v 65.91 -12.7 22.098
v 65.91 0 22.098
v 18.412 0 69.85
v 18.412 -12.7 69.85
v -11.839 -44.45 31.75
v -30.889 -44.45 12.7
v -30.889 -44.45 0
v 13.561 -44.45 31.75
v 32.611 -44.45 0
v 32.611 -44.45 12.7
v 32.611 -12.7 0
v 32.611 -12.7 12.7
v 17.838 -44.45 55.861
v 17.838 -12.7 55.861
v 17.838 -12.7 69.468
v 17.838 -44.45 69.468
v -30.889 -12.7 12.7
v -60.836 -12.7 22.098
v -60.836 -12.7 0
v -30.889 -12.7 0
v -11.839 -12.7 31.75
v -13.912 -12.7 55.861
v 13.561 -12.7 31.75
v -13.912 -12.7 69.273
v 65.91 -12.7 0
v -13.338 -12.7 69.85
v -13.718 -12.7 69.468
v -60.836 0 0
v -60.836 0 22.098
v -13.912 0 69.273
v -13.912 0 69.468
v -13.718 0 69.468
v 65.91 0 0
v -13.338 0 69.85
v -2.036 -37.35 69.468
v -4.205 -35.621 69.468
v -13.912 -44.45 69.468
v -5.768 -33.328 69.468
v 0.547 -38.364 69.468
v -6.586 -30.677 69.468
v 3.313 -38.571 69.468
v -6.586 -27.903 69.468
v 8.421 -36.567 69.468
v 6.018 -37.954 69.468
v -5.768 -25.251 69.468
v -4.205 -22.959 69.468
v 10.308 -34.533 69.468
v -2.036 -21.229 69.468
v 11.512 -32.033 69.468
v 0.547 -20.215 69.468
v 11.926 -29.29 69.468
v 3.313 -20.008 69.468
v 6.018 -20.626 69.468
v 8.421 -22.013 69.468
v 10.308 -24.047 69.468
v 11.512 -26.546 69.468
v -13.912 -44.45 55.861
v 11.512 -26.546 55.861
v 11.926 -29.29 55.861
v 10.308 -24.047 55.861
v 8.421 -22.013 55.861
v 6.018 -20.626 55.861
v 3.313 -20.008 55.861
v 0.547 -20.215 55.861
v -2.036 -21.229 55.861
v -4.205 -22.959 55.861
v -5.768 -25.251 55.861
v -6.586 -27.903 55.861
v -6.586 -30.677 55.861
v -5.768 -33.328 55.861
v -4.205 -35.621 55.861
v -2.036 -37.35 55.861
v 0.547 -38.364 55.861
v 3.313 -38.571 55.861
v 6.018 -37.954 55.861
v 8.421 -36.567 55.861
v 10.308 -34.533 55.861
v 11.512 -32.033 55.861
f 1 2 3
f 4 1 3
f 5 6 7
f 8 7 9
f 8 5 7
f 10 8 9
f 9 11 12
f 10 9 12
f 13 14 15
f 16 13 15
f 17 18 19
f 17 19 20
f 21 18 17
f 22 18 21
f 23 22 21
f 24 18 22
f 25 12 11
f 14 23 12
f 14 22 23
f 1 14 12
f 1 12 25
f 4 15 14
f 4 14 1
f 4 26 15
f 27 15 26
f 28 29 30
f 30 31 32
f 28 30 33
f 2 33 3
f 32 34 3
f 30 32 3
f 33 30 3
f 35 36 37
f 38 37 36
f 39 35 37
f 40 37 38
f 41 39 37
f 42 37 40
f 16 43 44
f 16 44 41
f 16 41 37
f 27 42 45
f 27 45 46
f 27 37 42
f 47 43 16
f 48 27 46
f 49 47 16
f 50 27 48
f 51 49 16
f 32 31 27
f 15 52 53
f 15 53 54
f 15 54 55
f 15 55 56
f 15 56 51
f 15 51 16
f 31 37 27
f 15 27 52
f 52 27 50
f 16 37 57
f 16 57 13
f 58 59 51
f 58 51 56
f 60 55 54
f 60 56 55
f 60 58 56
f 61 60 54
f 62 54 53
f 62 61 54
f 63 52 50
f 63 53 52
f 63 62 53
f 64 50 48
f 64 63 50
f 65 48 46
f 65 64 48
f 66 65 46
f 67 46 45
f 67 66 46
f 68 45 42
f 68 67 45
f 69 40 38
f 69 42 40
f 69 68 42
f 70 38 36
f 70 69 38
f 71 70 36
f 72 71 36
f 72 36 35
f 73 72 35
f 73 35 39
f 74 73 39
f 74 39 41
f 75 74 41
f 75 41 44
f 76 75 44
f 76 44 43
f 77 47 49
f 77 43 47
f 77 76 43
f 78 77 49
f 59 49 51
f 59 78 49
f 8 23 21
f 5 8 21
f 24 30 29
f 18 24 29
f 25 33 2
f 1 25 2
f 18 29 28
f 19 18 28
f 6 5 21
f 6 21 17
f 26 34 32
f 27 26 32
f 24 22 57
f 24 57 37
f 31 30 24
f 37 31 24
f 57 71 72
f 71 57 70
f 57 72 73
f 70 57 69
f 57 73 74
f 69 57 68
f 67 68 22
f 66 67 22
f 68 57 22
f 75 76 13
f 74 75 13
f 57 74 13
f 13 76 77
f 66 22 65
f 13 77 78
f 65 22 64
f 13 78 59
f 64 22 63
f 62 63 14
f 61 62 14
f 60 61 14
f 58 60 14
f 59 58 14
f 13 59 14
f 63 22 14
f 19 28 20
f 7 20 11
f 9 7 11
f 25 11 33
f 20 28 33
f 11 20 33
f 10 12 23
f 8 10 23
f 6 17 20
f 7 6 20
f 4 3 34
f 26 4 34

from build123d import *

# Parameters (mm, degrees)
F1_DEPTH = 44.45
F3_DEPTH = 12.7
F4_W     = 31.75
F4_H     = 13.6071431206
F5_DEPTH = 44.45
F7_START = 54.864
F6_R     = 9.3076399549
F7_DEPTH = 60.706


with BuildPart() as f1:
    # F0 (on Front) → F1 (new body)
    with BuildSketch(Plane.XZ):
        Polygon((13.5610163573, 31.75), (-11.8389836427, 31.75), (-30.8889836427, 12.7), (-30.8889836427, 0), (32.6110163573, 0), (32.6110163573, 12.7), align=None)
    extrude(amount=F1_DEPTH)

    # F2 (on Front) → F3 (join)
    with BuildSketch(Plane.XZ):
        Polygon((18.4121006752, 69.85), (-13.3378993248, 69.85), (-60.8358993248, 22.098), (-60.8358993248, 0), (65.9101006752, 0), (65.9101006752, 22.098), align=None)
    extrude(amount=F3_DEPTH)

    # F4 (on Front) → F5 (join)
    with BuildSketch(Plane.XZ):
        with Locations((1.9634375349, 62.6644603908)):
            Rectangle(F4_W, F4_H)
    extrude(amount=F5_DEPTH)

    # F6 (on Top) → F7 (cut)
    with BuildSketch(Plane.XY.offset(F7_START)):
        with Locations((2.6179165579, -29.2897745967)):
            Circle(F6_R)
    extrude(amount=F7_DEPTH, mode=Mode.SUBTRACT)


solid = f1.part
